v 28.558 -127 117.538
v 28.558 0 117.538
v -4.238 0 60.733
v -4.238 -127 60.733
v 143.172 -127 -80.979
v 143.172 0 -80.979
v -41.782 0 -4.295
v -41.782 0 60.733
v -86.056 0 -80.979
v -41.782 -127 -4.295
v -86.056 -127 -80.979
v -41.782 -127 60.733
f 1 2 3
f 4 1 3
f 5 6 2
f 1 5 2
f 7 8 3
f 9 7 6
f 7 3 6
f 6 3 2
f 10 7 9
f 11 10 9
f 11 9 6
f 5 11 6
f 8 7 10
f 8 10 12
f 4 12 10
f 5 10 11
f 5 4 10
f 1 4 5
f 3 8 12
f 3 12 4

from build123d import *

# Parameters (mm, degrees)
F0_W     = 96.628905
F0_H     = 101.417847
F1_DEPTH = 127
F3_DEPTH = 127


with BuildPart() as f1:
    # F0 (on Front) → F1 (new body)
    with BuildSketch(Plane.XZ):
        with Locations((6.532389, 10.024552)):
            Rectangle(F0_W, F0_H)
    extrude(amount=F1_DEPTH)

    # F2 (on Front) → F3 (join)
    with BuildSketch(Plane.XZ):
        Polygon((-86.055711, -80.979206), (143.171892, -80.979206), (28.55809, 117.537722), align=None)
    extrude(amount=F3_DEPTH)


solid = f1.part
